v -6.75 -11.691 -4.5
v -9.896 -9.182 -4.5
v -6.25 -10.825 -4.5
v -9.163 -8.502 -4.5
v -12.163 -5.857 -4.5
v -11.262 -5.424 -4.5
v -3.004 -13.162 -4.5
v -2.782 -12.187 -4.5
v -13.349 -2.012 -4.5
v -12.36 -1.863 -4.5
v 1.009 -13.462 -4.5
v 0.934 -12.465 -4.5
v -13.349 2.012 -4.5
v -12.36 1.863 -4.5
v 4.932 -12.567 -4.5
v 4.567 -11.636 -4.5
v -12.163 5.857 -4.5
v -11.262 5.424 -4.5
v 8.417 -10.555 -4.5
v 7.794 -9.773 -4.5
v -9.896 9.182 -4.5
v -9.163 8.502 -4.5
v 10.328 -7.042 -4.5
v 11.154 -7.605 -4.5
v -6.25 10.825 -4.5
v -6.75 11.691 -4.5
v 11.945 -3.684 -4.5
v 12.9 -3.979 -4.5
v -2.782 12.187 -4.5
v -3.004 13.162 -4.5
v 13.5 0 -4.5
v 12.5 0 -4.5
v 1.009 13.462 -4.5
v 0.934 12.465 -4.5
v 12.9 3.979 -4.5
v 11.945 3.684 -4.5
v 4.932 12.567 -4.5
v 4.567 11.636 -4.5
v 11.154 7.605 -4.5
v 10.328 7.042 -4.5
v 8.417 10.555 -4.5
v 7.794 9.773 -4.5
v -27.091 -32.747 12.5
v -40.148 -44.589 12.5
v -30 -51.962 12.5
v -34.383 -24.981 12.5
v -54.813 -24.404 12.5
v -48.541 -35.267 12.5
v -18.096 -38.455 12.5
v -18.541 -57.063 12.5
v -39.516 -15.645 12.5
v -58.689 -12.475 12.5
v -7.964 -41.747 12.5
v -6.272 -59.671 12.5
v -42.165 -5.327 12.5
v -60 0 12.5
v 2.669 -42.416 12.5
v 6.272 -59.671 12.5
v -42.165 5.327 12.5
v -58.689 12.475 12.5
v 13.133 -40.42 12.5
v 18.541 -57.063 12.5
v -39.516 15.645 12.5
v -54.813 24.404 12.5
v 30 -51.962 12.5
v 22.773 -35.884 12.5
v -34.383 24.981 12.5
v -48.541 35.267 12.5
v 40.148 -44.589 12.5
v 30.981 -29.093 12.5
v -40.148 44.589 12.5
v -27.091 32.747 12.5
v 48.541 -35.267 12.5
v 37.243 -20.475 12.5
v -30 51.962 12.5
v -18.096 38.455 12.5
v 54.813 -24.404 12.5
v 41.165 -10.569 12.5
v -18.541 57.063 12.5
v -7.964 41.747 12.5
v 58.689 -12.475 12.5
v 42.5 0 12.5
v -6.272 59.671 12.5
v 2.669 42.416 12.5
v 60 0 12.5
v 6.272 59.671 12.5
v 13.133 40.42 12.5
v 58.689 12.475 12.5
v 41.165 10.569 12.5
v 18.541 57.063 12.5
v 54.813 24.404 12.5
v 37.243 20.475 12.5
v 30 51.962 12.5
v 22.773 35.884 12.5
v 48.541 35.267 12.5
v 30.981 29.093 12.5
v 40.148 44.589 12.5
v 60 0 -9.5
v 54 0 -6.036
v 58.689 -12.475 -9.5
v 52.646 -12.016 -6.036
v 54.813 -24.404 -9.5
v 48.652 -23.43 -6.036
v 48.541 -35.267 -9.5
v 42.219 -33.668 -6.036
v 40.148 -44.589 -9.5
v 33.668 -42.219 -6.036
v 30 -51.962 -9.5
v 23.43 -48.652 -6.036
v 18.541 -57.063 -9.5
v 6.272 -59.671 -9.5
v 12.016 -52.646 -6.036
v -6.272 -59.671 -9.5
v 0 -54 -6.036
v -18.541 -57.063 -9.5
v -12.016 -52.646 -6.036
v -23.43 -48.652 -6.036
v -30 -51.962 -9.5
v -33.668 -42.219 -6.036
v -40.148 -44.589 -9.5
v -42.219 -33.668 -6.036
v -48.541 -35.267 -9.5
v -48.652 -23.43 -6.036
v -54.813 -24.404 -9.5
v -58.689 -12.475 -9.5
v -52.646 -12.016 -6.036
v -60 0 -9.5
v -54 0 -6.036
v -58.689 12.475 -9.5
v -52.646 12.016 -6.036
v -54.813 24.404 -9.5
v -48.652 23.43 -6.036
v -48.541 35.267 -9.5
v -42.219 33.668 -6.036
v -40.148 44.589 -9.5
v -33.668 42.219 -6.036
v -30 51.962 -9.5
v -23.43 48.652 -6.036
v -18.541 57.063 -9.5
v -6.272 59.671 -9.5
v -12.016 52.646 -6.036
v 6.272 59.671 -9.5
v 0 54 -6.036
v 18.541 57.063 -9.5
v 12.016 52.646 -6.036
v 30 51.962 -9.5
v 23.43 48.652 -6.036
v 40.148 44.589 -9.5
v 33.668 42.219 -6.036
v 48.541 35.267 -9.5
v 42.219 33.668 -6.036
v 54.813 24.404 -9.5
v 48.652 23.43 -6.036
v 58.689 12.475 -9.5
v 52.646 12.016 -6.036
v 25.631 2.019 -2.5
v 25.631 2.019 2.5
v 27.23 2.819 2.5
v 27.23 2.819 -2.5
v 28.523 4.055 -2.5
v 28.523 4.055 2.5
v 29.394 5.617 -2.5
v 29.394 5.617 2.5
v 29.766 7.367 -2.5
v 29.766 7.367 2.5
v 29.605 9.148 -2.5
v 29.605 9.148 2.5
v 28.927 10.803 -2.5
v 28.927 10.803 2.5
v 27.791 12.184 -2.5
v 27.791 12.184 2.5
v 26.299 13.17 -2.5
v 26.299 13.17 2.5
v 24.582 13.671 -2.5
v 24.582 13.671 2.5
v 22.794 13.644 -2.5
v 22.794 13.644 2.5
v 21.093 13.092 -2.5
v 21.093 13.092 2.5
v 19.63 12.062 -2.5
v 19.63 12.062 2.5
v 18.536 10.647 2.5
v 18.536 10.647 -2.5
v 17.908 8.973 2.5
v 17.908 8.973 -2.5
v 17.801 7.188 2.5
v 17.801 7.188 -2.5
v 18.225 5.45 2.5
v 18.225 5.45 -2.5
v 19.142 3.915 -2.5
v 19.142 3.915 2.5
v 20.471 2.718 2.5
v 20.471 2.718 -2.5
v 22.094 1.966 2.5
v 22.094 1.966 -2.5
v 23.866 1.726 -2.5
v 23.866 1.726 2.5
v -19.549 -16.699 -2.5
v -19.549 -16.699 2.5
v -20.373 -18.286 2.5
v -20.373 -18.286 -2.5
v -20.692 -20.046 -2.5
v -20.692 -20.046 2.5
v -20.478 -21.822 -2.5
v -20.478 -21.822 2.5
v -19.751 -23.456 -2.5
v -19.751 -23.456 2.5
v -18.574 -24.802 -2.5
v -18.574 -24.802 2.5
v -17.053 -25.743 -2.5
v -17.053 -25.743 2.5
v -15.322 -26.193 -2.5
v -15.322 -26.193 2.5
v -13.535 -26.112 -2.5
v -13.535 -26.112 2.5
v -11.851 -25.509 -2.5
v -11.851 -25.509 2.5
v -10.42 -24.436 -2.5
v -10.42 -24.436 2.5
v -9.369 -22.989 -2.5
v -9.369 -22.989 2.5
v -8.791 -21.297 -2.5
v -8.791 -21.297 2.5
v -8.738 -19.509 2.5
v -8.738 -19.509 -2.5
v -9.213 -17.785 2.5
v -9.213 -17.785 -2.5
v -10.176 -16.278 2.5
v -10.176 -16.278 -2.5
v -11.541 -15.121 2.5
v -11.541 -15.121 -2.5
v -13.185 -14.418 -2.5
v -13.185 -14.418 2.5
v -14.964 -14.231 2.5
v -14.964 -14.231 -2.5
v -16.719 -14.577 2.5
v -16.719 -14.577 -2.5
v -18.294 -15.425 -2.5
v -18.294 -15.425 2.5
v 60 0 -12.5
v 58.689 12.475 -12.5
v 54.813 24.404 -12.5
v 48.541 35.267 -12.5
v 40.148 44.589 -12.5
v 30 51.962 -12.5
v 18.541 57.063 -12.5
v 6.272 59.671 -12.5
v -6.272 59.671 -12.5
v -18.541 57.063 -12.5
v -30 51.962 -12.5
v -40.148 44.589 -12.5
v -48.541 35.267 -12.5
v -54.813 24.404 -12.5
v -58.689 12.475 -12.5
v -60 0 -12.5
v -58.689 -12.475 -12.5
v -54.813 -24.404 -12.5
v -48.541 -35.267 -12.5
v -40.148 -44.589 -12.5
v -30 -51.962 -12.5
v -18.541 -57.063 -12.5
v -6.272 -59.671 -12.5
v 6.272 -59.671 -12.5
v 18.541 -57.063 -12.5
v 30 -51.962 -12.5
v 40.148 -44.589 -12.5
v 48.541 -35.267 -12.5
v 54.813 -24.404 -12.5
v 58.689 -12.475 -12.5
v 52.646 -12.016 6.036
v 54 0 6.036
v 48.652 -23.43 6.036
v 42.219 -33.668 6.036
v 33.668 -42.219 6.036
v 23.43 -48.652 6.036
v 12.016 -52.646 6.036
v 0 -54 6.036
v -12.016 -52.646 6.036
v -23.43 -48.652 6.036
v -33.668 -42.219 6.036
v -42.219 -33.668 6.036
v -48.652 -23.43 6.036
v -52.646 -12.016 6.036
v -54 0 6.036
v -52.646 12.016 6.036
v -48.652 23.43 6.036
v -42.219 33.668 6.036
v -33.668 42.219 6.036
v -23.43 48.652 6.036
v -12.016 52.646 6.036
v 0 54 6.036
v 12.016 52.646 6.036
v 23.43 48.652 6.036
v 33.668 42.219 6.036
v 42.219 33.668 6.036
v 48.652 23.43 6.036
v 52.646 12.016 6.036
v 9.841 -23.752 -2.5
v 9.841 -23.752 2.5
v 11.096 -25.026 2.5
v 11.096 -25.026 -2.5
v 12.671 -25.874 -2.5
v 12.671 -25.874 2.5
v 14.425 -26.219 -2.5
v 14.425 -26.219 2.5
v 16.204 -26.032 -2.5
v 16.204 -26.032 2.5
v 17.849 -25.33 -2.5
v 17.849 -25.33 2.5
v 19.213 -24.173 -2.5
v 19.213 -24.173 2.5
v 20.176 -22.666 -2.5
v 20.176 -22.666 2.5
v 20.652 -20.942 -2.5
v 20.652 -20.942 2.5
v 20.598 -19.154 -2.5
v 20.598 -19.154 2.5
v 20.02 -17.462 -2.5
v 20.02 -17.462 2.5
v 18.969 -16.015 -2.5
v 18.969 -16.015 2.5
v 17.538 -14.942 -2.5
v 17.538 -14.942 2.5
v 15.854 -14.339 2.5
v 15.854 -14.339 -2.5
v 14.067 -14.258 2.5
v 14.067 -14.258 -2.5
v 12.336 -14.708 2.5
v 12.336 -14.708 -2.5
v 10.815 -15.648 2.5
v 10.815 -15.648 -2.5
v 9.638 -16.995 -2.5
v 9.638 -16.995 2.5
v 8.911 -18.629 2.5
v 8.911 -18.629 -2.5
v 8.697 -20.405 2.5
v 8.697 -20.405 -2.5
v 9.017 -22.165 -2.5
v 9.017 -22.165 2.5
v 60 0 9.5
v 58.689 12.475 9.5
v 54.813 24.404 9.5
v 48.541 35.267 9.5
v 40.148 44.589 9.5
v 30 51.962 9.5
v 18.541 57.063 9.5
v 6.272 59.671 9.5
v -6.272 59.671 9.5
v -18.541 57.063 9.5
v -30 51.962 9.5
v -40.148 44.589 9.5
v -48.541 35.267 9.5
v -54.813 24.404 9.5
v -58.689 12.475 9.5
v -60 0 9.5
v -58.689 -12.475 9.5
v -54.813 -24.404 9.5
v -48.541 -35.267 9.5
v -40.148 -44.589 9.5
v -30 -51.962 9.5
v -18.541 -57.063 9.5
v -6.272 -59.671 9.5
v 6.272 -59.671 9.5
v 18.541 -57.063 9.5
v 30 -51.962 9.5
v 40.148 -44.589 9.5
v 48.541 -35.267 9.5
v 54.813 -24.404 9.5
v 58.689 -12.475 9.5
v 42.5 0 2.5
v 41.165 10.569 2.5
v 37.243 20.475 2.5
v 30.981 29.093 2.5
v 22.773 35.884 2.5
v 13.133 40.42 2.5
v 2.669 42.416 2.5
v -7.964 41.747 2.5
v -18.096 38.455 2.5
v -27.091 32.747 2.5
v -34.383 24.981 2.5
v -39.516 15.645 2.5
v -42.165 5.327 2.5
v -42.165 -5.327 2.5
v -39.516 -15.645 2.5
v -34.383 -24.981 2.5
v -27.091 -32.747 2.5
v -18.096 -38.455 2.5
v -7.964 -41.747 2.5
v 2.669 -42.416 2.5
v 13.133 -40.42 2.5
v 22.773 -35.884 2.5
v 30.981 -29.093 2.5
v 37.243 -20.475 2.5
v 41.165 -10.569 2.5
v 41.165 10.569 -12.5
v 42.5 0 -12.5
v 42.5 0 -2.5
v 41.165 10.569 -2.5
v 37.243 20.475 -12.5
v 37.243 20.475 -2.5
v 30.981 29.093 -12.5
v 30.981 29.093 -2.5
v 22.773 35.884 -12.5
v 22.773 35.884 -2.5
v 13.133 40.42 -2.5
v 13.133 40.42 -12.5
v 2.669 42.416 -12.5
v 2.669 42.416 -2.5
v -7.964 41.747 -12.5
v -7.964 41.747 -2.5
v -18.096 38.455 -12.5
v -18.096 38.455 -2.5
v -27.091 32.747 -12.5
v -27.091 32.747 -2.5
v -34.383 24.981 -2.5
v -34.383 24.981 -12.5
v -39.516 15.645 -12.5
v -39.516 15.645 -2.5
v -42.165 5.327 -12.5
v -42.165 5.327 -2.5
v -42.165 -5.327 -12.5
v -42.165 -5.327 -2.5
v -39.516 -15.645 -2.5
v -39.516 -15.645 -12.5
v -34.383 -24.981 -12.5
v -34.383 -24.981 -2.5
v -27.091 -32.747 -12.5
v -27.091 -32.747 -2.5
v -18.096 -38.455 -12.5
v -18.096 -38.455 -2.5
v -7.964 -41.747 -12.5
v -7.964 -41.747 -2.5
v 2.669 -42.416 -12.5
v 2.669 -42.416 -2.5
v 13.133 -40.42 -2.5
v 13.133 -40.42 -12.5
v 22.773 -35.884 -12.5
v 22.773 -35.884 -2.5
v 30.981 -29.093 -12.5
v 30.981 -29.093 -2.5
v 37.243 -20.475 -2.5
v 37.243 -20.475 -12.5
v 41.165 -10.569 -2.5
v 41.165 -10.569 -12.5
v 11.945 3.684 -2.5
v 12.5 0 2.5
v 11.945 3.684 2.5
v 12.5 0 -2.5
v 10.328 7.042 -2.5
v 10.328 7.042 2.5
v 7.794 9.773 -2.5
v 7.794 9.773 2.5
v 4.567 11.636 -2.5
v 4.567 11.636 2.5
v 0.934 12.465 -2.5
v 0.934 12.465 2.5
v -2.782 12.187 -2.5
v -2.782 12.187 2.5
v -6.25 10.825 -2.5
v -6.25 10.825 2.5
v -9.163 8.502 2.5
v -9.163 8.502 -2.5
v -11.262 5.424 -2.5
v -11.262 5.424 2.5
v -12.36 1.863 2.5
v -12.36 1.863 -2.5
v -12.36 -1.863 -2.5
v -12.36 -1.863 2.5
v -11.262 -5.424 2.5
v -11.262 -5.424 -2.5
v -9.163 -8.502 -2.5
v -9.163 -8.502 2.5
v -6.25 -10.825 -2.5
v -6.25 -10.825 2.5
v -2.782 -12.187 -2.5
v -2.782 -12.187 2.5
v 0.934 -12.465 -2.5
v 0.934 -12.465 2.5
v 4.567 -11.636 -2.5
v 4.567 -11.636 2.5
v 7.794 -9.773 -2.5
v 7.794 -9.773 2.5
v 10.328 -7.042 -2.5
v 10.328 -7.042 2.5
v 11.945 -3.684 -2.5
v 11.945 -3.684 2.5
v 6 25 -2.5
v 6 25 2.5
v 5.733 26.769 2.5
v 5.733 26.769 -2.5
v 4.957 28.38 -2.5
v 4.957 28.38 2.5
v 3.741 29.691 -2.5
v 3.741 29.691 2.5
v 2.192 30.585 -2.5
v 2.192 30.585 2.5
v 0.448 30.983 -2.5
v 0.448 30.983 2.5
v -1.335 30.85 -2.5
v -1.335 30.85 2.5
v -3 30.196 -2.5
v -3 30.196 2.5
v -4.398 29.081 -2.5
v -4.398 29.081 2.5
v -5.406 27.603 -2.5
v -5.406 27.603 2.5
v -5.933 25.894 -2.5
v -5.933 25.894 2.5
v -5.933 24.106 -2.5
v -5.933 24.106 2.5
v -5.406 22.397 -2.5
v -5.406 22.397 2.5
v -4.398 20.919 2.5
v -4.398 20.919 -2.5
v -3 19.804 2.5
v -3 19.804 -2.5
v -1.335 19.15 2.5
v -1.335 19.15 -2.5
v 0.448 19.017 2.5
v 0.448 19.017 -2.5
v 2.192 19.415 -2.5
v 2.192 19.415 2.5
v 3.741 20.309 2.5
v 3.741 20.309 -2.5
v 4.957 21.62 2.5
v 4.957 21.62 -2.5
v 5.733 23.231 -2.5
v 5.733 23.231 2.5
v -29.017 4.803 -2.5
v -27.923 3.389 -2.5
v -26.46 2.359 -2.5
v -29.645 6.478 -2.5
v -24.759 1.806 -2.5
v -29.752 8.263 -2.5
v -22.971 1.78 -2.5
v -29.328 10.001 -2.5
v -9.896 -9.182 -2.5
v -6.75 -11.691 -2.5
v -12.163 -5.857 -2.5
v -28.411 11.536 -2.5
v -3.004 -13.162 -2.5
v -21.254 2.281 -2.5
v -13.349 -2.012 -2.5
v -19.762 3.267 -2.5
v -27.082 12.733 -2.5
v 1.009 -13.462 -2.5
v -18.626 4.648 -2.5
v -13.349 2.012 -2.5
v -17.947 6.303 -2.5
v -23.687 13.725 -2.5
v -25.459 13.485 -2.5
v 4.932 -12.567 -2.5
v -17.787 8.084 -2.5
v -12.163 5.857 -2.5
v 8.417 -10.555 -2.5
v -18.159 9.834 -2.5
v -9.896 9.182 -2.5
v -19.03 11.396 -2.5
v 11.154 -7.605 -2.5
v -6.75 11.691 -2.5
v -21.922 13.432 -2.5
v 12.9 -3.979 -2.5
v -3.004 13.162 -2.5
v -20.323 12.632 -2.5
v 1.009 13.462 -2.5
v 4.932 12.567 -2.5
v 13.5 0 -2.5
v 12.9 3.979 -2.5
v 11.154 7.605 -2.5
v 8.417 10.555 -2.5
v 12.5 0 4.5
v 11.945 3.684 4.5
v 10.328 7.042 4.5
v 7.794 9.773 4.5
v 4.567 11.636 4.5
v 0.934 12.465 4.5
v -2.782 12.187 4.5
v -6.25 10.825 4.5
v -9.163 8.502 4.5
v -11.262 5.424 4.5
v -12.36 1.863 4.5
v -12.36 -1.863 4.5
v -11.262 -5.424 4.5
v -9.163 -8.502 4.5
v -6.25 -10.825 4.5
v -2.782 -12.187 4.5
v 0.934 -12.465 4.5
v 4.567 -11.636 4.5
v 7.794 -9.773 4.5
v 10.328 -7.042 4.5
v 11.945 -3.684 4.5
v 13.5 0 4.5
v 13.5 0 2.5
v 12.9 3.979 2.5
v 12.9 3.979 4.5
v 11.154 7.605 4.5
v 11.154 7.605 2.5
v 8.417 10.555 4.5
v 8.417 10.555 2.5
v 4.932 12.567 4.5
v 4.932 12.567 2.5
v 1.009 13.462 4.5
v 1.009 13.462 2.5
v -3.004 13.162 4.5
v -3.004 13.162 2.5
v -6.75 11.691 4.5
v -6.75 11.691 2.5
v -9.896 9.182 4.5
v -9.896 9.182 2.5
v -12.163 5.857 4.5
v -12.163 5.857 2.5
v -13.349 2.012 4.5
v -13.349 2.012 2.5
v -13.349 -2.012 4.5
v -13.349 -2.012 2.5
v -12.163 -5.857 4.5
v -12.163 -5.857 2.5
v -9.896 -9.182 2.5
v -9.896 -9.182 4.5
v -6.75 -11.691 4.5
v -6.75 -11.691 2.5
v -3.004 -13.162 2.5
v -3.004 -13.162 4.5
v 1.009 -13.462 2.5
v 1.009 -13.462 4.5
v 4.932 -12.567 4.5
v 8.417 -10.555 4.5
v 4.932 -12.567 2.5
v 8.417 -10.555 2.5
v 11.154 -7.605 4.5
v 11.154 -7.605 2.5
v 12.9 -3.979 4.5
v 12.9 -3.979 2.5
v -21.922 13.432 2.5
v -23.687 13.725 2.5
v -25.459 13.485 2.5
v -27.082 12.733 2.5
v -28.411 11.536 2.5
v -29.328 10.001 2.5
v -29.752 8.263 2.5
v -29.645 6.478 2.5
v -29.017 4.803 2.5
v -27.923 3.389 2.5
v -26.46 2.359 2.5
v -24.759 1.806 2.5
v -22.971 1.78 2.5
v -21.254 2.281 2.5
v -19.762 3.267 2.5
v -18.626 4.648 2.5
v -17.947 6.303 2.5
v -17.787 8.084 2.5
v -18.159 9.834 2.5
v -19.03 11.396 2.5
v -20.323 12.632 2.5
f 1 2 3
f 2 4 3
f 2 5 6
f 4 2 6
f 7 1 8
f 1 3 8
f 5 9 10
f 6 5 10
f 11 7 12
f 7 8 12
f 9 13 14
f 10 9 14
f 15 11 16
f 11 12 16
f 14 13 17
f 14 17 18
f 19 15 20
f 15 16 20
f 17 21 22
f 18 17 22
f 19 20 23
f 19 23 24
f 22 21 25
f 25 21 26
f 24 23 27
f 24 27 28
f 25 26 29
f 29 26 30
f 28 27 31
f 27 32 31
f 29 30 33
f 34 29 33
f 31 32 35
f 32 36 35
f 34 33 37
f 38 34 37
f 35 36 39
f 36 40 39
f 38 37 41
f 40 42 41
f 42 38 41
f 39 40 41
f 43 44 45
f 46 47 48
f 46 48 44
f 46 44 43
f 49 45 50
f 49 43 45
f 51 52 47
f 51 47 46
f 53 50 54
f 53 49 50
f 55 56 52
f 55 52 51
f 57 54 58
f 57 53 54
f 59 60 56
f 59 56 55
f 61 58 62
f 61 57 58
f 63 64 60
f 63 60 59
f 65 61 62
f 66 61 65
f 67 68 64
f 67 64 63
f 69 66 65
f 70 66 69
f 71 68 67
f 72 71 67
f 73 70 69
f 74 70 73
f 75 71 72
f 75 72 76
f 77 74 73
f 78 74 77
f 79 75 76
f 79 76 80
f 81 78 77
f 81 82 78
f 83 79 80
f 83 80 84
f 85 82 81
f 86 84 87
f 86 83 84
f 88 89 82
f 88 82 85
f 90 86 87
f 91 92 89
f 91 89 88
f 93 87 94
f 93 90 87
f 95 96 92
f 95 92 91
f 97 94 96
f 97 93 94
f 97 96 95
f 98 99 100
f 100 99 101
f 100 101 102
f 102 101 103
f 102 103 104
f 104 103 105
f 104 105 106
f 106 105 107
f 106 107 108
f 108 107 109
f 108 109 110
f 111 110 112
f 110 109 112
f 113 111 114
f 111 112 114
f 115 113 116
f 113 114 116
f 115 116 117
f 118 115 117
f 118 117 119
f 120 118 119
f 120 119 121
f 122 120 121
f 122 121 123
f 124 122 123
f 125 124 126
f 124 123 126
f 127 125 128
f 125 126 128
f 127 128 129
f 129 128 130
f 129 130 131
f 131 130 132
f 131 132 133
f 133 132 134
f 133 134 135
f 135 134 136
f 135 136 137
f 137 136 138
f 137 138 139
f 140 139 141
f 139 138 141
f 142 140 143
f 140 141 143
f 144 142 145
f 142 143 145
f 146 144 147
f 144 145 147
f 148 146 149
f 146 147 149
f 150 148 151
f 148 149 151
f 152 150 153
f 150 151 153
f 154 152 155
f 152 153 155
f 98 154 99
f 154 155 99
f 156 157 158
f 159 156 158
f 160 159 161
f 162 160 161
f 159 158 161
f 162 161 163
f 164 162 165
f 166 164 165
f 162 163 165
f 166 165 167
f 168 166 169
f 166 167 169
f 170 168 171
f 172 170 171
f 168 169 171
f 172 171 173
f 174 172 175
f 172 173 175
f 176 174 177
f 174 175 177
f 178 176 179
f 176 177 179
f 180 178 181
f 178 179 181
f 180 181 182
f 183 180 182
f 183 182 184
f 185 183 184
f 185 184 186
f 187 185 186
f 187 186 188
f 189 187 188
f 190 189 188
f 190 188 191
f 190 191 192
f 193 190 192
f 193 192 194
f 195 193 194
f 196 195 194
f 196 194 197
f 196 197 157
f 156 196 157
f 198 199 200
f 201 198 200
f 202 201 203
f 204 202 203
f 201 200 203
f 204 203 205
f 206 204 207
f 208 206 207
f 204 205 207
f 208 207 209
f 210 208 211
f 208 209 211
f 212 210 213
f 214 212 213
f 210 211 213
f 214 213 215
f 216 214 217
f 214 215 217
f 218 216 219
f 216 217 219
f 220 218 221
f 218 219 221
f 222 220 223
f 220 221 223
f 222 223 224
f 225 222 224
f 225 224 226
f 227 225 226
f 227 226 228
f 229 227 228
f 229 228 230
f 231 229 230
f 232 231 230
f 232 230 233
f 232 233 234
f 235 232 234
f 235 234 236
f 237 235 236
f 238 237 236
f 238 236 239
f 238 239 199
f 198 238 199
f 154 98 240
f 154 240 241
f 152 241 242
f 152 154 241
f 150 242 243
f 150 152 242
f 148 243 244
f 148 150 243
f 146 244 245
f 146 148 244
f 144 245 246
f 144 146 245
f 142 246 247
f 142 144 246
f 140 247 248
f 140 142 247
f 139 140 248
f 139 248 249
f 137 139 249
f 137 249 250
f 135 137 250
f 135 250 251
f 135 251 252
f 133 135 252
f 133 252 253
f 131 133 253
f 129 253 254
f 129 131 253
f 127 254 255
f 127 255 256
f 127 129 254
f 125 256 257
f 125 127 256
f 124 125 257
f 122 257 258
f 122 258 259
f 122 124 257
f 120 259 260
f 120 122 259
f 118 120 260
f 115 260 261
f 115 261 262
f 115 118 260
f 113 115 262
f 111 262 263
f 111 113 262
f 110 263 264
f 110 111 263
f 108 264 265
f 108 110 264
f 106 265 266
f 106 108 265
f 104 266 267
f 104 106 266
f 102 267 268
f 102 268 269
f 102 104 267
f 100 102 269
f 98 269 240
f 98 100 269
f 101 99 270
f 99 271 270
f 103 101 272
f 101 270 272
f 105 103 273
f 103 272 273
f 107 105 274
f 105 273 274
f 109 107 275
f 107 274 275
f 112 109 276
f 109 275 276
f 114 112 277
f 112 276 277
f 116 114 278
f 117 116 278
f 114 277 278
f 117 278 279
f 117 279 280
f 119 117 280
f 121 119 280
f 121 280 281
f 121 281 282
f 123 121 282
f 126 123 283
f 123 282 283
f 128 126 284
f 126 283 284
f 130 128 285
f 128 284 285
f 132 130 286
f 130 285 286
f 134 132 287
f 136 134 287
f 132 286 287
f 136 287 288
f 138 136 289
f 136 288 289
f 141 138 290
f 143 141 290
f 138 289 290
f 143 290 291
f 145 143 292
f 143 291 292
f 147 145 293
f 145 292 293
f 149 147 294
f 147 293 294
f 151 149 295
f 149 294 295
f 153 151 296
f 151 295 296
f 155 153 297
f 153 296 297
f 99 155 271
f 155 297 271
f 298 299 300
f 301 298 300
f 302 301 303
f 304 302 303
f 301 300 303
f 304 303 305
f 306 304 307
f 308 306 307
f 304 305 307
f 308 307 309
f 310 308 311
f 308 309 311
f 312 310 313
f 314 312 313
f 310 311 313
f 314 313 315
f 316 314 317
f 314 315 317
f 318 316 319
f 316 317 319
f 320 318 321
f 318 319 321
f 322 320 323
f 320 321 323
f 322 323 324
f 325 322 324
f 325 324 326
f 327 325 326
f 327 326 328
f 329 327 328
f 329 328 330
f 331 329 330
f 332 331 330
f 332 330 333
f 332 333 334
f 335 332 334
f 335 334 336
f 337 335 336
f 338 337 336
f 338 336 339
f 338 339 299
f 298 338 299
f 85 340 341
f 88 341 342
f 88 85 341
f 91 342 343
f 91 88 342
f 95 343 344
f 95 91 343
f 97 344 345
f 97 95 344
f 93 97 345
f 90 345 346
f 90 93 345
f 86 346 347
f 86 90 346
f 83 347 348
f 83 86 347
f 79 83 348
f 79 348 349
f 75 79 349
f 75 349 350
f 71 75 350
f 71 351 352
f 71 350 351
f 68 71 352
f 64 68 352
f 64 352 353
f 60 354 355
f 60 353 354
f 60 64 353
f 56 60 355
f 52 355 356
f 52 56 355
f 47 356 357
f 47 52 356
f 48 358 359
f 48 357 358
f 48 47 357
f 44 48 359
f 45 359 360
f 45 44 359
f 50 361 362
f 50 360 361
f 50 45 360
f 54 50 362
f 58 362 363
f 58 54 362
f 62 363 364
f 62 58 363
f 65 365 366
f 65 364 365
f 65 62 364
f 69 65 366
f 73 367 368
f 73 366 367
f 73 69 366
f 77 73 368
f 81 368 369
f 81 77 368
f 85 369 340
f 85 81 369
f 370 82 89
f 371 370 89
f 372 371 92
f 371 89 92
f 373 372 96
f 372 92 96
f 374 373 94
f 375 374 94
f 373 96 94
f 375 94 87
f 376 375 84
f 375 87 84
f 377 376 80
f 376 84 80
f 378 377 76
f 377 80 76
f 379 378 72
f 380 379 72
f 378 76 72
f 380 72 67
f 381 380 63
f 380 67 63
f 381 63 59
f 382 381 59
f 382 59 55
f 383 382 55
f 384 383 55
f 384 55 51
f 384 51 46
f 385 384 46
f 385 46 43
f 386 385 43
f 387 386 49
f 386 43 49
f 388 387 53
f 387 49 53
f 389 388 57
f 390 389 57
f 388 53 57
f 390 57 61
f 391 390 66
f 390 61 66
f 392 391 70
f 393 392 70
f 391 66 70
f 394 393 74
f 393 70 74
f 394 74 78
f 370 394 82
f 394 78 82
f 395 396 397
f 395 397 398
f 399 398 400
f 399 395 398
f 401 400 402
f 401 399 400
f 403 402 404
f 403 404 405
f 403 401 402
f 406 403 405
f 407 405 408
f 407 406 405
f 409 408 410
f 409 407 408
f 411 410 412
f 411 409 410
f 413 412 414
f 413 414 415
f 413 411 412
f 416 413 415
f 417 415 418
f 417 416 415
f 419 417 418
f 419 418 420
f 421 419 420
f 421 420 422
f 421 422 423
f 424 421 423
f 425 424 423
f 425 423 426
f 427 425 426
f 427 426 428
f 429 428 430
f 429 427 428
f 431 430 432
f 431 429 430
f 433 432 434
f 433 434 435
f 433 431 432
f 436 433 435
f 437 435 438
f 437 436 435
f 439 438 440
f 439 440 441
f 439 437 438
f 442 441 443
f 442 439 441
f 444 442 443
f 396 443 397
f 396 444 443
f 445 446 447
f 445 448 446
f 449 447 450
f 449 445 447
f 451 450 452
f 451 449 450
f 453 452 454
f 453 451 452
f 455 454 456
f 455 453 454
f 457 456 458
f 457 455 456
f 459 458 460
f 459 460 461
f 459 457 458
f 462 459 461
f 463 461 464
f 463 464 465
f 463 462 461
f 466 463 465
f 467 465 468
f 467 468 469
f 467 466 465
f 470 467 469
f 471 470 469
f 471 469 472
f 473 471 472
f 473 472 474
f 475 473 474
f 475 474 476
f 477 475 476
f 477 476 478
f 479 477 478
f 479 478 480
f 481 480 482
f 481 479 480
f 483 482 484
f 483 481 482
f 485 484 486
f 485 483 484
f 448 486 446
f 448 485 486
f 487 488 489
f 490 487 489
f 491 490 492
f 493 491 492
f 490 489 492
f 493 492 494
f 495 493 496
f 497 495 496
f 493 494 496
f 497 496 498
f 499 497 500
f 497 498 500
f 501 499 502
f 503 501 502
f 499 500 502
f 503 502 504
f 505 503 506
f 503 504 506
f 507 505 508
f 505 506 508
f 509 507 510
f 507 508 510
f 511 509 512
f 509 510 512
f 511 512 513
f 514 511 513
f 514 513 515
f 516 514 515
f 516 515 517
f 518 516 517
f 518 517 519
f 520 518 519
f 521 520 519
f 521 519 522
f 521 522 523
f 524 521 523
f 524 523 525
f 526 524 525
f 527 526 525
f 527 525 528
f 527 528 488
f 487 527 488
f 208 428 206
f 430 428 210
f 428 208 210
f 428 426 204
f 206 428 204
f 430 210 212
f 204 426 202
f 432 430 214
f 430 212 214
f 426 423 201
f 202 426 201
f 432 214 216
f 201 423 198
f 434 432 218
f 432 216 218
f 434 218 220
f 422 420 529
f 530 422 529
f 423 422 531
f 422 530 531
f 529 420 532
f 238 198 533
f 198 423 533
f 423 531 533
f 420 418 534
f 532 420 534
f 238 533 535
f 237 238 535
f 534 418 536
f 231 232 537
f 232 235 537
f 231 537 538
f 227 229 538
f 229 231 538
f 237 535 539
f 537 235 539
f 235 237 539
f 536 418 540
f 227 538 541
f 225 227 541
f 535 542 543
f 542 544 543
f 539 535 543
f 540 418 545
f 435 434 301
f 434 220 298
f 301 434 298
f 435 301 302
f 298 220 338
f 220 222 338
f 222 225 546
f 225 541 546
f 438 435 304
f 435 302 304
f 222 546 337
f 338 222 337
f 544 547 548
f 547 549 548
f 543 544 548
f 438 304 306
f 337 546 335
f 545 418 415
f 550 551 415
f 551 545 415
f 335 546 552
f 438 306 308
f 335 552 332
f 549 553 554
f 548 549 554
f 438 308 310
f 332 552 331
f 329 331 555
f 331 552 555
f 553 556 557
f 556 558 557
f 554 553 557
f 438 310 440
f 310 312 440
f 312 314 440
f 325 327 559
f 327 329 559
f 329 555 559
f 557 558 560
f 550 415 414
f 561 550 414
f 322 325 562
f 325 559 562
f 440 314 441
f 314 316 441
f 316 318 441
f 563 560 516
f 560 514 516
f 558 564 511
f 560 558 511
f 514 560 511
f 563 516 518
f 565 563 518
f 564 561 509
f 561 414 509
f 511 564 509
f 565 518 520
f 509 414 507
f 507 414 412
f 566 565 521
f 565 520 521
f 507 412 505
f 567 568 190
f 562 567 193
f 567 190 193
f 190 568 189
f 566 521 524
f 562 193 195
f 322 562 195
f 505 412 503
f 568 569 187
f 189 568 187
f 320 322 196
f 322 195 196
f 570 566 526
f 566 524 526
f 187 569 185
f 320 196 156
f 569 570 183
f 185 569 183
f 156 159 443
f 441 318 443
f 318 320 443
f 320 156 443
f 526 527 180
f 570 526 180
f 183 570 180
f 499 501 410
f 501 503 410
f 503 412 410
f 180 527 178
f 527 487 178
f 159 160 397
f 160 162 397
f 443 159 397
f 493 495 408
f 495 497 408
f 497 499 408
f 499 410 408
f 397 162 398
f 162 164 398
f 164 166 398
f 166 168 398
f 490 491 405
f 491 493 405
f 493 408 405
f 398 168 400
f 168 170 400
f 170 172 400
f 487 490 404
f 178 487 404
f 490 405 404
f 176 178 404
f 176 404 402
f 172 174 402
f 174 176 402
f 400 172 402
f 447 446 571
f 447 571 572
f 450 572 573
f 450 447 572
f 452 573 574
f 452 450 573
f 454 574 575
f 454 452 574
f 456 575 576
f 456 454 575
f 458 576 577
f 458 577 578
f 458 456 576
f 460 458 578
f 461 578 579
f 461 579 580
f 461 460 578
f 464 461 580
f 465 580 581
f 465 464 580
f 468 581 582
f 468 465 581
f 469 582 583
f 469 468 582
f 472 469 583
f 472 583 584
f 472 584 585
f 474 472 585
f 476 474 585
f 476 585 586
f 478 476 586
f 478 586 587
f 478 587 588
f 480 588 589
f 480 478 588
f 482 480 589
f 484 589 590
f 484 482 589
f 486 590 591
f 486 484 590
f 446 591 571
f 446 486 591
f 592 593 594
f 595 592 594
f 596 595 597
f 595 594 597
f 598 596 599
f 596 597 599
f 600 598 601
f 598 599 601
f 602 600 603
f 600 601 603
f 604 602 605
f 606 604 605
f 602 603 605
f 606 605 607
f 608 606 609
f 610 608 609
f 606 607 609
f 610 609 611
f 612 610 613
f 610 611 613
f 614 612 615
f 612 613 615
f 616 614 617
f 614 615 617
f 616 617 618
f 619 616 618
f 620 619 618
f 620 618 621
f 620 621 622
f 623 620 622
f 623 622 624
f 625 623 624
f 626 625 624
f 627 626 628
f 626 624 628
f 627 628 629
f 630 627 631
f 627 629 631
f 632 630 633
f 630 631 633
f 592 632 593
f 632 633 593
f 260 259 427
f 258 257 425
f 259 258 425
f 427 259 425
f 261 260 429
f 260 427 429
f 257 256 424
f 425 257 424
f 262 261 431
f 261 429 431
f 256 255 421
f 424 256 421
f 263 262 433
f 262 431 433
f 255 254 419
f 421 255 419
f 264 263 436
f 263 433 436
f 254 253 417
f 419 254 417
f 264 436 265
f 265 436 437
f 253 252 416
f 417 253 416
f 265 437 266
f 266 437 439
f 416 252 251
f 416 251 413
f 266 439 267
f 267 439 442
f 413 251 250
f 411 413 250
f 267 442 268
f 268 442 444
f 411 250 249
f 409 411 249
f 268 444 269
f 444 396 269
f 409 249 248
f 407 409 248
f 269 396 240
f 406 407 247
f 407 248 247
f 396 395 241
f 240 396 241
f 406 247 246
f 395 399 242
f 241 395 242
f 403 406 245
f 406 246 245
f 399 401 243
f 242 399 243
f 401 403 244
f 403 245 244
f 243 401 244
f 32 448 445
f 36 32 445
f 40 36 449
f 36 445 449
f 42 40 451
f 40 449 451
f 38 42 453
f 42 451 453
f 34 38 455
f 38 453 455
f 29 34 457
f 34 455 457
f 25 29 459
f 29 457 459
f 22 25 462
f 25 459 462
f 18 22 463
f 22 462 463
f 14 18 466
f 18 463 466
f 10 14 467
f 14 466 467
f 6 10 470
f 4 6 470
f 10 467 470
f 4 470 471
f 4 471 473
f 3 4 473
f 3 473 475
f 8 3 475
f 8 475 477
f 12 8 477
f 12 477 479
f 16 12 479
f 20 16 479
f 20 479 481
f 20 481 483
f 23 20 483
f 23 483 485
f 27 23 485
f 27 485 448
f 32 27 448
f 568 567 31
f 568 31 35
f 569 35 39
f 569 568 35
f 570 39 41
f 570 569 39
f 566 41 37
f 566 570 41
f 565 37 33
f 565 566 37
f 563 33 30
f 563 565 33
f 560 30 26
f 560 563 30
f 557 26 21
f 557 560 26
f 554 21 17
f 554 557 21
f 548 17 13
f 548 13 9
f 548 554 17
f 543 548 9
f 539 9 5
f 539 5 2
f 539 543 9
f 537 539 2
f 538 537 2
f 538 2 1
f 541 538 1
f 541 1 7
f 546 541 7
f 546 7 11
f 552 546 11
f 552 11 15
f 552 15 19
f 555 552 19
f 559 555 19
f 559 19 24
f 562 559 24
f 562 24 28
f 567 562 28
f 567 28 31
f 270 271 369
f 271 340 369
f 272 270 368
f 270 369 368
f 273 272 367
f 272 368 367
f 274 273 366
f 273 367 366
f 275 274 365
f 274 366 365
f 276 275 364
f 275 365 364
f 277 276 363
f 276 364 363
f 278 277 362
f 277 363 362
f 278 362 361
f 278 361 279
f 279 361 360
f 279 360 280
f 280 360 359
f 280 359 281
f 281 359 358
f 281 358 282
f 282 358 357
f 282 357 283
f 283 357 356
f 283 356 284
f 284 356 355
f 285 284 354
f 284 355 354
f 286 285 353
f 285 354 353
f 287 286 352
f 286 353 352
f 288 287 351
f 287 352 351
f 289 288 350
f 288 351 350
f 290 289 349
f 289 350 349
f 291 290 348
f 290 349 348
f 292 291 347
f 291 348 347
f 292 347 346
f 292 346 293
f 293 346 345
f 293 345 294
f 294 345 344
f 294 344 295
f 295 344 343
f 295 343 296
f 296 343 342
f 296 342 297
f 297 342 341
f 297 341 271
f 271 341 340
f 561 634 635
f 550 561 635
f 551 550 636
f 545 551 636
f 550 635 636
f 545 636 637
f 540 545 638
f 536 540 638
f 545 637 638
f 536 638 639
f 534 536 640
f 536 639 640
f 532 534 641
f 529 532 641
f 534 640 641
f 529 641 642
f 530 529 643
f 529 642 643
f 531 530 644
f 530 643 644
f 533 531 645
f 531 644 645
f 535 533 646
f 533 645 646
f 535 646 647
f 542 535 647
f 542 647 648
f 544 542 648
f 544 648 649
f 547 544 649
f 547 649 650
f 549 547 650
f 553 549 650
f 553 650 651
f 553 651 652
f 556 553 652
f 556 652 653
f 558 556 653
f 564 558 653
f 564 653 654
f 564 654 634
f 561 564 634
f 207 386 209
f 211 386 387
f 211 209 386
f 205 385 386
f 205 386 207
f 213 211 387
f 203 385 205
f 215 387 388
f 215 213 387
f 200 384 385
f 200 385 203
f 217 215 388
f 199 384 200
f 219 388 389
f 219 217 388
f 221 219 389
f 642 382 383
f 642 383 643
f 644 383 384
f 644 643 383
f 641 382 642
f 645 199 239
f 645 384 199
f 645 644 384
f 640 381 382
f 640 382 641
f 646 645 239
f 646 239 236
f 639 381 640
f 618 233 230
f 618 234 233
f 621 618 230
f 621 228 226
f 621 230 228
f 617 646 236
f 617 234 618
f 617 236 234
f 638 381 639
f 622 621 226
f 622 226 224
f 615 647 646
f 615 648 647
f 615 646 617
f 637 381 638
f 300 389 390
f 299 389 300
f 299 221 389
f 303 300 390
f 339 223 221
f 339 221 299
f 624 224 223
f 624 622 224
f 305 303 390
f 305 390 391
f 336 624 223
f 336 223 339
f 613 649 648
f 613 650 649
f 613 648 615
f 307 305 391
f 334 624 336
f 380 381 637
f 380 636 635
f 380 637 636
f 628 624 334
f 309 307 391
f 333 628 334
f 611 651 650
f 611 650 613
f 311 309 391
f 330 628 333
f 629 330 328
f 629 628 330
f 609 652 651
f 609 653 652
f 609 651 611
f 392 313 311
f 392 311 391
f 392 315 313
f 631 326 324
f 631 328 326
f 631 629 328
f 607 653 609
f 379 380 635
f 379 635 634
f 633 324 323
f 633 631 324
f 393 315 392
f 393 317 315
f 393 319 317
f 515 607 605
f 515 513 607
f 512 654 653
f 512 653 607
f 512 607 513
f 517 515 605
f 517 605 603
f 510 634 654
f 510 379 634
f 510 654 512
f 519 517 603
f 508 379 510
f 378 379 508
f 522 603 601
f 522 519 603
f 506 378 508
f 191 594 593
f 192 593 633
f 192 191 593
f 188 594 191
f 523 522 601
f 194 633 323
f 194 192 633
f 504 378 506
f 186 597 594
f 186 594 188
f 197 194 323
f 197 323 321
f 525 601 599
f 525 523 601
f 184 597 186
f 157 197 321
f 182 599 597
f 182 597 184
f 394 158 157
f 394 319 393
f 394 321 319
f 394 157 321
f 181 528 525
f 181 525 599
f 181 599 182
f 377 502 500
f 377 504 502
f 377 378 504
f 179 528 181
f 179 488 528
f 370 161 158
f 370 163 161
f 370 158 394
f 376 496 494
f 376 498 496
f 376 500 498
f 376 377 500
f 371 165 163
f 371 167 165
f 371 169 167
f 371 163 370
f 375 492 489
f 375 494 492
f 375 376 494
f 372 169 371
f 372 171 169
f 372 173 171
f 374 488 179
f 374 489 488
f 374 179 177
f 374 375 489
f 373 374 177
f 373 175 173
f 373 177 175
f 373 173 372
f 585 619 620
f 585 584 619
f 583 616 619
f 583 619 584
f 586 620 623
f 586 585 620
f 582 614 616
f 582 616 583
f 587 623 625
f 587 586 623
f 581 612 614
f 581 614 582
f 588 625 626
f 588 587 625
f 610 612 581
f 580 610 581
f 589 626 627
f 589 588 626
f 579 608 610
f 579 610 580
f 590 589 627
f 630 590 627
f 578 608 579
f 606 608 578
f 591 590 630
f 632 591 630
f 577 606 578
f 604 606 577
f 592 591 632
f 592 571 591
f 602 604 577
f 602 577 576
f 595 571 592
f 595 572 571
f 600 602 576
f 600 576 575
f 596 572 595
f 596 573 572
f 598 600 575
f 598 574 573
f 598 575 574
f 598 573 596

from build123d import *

# Parameters (mm, degrees)
SKETCH1_R                = 60
SKETCH1_R_2              = 12.5
BOSS_EXTRUDE1_DEPTH      = 12.5
SKETCH2_R                = 42.5
CUT_EXTRUDE1_DEPTH       = 10
SKETCH3_R                = 6
CUT_EXTRUDE2_DEPTH       = 16
CIRPATTERN1_COUNT        = 5
SKETCH5_R                = 13.5
SKETCH5_R_2              = 12.5
BOSS_EXTRUDE2_DEPTH      = 2
BOSS_EXTRUDE2_DEPTH_BACK = 7


with BuildPart() as part:
    # Sketch1 → Boss-Extrude1 (new body, symmetric)
    with BuildSketch(Plane.XY):
        Circle(SKETCH1_R)
        Circle(SKETCH1_R_2, mode=Mode.SUBTRACT)
    extrude(amount=BOSS_EXTRUDE1_DEPTH, both=True)

    # Sketch2 → Cut-Extrude1 (cut)
    with BuildSketch(Plane.XY.offset(12.5)):
        Circle(SKETCH2_R)
    cut_extrude1 = extrude(amount=-CUT_EXTRUDE1_DEPTH, mode=Mode.SUBTRACT)

    # Mirror1: Cut-Extrude1 across plane
    add(cut_extrude1.mirror(Plane.XY), mode=Mode.SUBTRACT)

    # Sketch3 → Cut-Extrude2 (cut, through all)
    with BuildSketch(Plane.XY.offset(2.5)):
        with Locations((0, 25)):
            Circle(SKETCH3_R)
    cut_extrude2 = extrude(amount=-CUT_EXTRUDE2_DEPTH, mode=Mode.SUBTRACT)

    # CirPattern1: Cut-Extrude2 ×5 about axis
    cirpattern1_axis = Axis((0, 0, 0), (0, 0, 1))
    for i in range(1, CIRPATTERN1_COUNT):
        add(cut_extrude2.rotate(cirpattern1_axis, i * 360 / CIRPATTERN1_COUNT), mode=Mode.SUBTRACT)

    # Sketch4 → Cut-Revolve1 (revolve, cut)
    with BuildSketch(Plane(origin=(0, 0, 0), x_dir=(1, 0, 0), z_dir=(0, 1, 0))):
        Polygon((60, 9.5), (54, 6.035898385), (54, -6.035898385), (60, -9.5), align=None)
    revolve(axis=Axis((0, 0, 0), (0, 0, -1)), mode=Mode.SUBTRACT)

    # Sketch5 → Boss-Extrude2 (add, two sides)
    with BuildSketch(Plane.XY.offset(2.5)) as boss_extrude2_sk:
        Circle(SKETCH5_R)
        Circle(SKETCH5_R_2, mode=Mode.SUBTRACT)
    extrude(amount=BOSS_EXTRUDE2_DEPTH)
    extrude(boss_extrude2_sk.sketch, amount=-BOSS_EXTRUDE2_DEPTH_BACK)


solid = part.part
